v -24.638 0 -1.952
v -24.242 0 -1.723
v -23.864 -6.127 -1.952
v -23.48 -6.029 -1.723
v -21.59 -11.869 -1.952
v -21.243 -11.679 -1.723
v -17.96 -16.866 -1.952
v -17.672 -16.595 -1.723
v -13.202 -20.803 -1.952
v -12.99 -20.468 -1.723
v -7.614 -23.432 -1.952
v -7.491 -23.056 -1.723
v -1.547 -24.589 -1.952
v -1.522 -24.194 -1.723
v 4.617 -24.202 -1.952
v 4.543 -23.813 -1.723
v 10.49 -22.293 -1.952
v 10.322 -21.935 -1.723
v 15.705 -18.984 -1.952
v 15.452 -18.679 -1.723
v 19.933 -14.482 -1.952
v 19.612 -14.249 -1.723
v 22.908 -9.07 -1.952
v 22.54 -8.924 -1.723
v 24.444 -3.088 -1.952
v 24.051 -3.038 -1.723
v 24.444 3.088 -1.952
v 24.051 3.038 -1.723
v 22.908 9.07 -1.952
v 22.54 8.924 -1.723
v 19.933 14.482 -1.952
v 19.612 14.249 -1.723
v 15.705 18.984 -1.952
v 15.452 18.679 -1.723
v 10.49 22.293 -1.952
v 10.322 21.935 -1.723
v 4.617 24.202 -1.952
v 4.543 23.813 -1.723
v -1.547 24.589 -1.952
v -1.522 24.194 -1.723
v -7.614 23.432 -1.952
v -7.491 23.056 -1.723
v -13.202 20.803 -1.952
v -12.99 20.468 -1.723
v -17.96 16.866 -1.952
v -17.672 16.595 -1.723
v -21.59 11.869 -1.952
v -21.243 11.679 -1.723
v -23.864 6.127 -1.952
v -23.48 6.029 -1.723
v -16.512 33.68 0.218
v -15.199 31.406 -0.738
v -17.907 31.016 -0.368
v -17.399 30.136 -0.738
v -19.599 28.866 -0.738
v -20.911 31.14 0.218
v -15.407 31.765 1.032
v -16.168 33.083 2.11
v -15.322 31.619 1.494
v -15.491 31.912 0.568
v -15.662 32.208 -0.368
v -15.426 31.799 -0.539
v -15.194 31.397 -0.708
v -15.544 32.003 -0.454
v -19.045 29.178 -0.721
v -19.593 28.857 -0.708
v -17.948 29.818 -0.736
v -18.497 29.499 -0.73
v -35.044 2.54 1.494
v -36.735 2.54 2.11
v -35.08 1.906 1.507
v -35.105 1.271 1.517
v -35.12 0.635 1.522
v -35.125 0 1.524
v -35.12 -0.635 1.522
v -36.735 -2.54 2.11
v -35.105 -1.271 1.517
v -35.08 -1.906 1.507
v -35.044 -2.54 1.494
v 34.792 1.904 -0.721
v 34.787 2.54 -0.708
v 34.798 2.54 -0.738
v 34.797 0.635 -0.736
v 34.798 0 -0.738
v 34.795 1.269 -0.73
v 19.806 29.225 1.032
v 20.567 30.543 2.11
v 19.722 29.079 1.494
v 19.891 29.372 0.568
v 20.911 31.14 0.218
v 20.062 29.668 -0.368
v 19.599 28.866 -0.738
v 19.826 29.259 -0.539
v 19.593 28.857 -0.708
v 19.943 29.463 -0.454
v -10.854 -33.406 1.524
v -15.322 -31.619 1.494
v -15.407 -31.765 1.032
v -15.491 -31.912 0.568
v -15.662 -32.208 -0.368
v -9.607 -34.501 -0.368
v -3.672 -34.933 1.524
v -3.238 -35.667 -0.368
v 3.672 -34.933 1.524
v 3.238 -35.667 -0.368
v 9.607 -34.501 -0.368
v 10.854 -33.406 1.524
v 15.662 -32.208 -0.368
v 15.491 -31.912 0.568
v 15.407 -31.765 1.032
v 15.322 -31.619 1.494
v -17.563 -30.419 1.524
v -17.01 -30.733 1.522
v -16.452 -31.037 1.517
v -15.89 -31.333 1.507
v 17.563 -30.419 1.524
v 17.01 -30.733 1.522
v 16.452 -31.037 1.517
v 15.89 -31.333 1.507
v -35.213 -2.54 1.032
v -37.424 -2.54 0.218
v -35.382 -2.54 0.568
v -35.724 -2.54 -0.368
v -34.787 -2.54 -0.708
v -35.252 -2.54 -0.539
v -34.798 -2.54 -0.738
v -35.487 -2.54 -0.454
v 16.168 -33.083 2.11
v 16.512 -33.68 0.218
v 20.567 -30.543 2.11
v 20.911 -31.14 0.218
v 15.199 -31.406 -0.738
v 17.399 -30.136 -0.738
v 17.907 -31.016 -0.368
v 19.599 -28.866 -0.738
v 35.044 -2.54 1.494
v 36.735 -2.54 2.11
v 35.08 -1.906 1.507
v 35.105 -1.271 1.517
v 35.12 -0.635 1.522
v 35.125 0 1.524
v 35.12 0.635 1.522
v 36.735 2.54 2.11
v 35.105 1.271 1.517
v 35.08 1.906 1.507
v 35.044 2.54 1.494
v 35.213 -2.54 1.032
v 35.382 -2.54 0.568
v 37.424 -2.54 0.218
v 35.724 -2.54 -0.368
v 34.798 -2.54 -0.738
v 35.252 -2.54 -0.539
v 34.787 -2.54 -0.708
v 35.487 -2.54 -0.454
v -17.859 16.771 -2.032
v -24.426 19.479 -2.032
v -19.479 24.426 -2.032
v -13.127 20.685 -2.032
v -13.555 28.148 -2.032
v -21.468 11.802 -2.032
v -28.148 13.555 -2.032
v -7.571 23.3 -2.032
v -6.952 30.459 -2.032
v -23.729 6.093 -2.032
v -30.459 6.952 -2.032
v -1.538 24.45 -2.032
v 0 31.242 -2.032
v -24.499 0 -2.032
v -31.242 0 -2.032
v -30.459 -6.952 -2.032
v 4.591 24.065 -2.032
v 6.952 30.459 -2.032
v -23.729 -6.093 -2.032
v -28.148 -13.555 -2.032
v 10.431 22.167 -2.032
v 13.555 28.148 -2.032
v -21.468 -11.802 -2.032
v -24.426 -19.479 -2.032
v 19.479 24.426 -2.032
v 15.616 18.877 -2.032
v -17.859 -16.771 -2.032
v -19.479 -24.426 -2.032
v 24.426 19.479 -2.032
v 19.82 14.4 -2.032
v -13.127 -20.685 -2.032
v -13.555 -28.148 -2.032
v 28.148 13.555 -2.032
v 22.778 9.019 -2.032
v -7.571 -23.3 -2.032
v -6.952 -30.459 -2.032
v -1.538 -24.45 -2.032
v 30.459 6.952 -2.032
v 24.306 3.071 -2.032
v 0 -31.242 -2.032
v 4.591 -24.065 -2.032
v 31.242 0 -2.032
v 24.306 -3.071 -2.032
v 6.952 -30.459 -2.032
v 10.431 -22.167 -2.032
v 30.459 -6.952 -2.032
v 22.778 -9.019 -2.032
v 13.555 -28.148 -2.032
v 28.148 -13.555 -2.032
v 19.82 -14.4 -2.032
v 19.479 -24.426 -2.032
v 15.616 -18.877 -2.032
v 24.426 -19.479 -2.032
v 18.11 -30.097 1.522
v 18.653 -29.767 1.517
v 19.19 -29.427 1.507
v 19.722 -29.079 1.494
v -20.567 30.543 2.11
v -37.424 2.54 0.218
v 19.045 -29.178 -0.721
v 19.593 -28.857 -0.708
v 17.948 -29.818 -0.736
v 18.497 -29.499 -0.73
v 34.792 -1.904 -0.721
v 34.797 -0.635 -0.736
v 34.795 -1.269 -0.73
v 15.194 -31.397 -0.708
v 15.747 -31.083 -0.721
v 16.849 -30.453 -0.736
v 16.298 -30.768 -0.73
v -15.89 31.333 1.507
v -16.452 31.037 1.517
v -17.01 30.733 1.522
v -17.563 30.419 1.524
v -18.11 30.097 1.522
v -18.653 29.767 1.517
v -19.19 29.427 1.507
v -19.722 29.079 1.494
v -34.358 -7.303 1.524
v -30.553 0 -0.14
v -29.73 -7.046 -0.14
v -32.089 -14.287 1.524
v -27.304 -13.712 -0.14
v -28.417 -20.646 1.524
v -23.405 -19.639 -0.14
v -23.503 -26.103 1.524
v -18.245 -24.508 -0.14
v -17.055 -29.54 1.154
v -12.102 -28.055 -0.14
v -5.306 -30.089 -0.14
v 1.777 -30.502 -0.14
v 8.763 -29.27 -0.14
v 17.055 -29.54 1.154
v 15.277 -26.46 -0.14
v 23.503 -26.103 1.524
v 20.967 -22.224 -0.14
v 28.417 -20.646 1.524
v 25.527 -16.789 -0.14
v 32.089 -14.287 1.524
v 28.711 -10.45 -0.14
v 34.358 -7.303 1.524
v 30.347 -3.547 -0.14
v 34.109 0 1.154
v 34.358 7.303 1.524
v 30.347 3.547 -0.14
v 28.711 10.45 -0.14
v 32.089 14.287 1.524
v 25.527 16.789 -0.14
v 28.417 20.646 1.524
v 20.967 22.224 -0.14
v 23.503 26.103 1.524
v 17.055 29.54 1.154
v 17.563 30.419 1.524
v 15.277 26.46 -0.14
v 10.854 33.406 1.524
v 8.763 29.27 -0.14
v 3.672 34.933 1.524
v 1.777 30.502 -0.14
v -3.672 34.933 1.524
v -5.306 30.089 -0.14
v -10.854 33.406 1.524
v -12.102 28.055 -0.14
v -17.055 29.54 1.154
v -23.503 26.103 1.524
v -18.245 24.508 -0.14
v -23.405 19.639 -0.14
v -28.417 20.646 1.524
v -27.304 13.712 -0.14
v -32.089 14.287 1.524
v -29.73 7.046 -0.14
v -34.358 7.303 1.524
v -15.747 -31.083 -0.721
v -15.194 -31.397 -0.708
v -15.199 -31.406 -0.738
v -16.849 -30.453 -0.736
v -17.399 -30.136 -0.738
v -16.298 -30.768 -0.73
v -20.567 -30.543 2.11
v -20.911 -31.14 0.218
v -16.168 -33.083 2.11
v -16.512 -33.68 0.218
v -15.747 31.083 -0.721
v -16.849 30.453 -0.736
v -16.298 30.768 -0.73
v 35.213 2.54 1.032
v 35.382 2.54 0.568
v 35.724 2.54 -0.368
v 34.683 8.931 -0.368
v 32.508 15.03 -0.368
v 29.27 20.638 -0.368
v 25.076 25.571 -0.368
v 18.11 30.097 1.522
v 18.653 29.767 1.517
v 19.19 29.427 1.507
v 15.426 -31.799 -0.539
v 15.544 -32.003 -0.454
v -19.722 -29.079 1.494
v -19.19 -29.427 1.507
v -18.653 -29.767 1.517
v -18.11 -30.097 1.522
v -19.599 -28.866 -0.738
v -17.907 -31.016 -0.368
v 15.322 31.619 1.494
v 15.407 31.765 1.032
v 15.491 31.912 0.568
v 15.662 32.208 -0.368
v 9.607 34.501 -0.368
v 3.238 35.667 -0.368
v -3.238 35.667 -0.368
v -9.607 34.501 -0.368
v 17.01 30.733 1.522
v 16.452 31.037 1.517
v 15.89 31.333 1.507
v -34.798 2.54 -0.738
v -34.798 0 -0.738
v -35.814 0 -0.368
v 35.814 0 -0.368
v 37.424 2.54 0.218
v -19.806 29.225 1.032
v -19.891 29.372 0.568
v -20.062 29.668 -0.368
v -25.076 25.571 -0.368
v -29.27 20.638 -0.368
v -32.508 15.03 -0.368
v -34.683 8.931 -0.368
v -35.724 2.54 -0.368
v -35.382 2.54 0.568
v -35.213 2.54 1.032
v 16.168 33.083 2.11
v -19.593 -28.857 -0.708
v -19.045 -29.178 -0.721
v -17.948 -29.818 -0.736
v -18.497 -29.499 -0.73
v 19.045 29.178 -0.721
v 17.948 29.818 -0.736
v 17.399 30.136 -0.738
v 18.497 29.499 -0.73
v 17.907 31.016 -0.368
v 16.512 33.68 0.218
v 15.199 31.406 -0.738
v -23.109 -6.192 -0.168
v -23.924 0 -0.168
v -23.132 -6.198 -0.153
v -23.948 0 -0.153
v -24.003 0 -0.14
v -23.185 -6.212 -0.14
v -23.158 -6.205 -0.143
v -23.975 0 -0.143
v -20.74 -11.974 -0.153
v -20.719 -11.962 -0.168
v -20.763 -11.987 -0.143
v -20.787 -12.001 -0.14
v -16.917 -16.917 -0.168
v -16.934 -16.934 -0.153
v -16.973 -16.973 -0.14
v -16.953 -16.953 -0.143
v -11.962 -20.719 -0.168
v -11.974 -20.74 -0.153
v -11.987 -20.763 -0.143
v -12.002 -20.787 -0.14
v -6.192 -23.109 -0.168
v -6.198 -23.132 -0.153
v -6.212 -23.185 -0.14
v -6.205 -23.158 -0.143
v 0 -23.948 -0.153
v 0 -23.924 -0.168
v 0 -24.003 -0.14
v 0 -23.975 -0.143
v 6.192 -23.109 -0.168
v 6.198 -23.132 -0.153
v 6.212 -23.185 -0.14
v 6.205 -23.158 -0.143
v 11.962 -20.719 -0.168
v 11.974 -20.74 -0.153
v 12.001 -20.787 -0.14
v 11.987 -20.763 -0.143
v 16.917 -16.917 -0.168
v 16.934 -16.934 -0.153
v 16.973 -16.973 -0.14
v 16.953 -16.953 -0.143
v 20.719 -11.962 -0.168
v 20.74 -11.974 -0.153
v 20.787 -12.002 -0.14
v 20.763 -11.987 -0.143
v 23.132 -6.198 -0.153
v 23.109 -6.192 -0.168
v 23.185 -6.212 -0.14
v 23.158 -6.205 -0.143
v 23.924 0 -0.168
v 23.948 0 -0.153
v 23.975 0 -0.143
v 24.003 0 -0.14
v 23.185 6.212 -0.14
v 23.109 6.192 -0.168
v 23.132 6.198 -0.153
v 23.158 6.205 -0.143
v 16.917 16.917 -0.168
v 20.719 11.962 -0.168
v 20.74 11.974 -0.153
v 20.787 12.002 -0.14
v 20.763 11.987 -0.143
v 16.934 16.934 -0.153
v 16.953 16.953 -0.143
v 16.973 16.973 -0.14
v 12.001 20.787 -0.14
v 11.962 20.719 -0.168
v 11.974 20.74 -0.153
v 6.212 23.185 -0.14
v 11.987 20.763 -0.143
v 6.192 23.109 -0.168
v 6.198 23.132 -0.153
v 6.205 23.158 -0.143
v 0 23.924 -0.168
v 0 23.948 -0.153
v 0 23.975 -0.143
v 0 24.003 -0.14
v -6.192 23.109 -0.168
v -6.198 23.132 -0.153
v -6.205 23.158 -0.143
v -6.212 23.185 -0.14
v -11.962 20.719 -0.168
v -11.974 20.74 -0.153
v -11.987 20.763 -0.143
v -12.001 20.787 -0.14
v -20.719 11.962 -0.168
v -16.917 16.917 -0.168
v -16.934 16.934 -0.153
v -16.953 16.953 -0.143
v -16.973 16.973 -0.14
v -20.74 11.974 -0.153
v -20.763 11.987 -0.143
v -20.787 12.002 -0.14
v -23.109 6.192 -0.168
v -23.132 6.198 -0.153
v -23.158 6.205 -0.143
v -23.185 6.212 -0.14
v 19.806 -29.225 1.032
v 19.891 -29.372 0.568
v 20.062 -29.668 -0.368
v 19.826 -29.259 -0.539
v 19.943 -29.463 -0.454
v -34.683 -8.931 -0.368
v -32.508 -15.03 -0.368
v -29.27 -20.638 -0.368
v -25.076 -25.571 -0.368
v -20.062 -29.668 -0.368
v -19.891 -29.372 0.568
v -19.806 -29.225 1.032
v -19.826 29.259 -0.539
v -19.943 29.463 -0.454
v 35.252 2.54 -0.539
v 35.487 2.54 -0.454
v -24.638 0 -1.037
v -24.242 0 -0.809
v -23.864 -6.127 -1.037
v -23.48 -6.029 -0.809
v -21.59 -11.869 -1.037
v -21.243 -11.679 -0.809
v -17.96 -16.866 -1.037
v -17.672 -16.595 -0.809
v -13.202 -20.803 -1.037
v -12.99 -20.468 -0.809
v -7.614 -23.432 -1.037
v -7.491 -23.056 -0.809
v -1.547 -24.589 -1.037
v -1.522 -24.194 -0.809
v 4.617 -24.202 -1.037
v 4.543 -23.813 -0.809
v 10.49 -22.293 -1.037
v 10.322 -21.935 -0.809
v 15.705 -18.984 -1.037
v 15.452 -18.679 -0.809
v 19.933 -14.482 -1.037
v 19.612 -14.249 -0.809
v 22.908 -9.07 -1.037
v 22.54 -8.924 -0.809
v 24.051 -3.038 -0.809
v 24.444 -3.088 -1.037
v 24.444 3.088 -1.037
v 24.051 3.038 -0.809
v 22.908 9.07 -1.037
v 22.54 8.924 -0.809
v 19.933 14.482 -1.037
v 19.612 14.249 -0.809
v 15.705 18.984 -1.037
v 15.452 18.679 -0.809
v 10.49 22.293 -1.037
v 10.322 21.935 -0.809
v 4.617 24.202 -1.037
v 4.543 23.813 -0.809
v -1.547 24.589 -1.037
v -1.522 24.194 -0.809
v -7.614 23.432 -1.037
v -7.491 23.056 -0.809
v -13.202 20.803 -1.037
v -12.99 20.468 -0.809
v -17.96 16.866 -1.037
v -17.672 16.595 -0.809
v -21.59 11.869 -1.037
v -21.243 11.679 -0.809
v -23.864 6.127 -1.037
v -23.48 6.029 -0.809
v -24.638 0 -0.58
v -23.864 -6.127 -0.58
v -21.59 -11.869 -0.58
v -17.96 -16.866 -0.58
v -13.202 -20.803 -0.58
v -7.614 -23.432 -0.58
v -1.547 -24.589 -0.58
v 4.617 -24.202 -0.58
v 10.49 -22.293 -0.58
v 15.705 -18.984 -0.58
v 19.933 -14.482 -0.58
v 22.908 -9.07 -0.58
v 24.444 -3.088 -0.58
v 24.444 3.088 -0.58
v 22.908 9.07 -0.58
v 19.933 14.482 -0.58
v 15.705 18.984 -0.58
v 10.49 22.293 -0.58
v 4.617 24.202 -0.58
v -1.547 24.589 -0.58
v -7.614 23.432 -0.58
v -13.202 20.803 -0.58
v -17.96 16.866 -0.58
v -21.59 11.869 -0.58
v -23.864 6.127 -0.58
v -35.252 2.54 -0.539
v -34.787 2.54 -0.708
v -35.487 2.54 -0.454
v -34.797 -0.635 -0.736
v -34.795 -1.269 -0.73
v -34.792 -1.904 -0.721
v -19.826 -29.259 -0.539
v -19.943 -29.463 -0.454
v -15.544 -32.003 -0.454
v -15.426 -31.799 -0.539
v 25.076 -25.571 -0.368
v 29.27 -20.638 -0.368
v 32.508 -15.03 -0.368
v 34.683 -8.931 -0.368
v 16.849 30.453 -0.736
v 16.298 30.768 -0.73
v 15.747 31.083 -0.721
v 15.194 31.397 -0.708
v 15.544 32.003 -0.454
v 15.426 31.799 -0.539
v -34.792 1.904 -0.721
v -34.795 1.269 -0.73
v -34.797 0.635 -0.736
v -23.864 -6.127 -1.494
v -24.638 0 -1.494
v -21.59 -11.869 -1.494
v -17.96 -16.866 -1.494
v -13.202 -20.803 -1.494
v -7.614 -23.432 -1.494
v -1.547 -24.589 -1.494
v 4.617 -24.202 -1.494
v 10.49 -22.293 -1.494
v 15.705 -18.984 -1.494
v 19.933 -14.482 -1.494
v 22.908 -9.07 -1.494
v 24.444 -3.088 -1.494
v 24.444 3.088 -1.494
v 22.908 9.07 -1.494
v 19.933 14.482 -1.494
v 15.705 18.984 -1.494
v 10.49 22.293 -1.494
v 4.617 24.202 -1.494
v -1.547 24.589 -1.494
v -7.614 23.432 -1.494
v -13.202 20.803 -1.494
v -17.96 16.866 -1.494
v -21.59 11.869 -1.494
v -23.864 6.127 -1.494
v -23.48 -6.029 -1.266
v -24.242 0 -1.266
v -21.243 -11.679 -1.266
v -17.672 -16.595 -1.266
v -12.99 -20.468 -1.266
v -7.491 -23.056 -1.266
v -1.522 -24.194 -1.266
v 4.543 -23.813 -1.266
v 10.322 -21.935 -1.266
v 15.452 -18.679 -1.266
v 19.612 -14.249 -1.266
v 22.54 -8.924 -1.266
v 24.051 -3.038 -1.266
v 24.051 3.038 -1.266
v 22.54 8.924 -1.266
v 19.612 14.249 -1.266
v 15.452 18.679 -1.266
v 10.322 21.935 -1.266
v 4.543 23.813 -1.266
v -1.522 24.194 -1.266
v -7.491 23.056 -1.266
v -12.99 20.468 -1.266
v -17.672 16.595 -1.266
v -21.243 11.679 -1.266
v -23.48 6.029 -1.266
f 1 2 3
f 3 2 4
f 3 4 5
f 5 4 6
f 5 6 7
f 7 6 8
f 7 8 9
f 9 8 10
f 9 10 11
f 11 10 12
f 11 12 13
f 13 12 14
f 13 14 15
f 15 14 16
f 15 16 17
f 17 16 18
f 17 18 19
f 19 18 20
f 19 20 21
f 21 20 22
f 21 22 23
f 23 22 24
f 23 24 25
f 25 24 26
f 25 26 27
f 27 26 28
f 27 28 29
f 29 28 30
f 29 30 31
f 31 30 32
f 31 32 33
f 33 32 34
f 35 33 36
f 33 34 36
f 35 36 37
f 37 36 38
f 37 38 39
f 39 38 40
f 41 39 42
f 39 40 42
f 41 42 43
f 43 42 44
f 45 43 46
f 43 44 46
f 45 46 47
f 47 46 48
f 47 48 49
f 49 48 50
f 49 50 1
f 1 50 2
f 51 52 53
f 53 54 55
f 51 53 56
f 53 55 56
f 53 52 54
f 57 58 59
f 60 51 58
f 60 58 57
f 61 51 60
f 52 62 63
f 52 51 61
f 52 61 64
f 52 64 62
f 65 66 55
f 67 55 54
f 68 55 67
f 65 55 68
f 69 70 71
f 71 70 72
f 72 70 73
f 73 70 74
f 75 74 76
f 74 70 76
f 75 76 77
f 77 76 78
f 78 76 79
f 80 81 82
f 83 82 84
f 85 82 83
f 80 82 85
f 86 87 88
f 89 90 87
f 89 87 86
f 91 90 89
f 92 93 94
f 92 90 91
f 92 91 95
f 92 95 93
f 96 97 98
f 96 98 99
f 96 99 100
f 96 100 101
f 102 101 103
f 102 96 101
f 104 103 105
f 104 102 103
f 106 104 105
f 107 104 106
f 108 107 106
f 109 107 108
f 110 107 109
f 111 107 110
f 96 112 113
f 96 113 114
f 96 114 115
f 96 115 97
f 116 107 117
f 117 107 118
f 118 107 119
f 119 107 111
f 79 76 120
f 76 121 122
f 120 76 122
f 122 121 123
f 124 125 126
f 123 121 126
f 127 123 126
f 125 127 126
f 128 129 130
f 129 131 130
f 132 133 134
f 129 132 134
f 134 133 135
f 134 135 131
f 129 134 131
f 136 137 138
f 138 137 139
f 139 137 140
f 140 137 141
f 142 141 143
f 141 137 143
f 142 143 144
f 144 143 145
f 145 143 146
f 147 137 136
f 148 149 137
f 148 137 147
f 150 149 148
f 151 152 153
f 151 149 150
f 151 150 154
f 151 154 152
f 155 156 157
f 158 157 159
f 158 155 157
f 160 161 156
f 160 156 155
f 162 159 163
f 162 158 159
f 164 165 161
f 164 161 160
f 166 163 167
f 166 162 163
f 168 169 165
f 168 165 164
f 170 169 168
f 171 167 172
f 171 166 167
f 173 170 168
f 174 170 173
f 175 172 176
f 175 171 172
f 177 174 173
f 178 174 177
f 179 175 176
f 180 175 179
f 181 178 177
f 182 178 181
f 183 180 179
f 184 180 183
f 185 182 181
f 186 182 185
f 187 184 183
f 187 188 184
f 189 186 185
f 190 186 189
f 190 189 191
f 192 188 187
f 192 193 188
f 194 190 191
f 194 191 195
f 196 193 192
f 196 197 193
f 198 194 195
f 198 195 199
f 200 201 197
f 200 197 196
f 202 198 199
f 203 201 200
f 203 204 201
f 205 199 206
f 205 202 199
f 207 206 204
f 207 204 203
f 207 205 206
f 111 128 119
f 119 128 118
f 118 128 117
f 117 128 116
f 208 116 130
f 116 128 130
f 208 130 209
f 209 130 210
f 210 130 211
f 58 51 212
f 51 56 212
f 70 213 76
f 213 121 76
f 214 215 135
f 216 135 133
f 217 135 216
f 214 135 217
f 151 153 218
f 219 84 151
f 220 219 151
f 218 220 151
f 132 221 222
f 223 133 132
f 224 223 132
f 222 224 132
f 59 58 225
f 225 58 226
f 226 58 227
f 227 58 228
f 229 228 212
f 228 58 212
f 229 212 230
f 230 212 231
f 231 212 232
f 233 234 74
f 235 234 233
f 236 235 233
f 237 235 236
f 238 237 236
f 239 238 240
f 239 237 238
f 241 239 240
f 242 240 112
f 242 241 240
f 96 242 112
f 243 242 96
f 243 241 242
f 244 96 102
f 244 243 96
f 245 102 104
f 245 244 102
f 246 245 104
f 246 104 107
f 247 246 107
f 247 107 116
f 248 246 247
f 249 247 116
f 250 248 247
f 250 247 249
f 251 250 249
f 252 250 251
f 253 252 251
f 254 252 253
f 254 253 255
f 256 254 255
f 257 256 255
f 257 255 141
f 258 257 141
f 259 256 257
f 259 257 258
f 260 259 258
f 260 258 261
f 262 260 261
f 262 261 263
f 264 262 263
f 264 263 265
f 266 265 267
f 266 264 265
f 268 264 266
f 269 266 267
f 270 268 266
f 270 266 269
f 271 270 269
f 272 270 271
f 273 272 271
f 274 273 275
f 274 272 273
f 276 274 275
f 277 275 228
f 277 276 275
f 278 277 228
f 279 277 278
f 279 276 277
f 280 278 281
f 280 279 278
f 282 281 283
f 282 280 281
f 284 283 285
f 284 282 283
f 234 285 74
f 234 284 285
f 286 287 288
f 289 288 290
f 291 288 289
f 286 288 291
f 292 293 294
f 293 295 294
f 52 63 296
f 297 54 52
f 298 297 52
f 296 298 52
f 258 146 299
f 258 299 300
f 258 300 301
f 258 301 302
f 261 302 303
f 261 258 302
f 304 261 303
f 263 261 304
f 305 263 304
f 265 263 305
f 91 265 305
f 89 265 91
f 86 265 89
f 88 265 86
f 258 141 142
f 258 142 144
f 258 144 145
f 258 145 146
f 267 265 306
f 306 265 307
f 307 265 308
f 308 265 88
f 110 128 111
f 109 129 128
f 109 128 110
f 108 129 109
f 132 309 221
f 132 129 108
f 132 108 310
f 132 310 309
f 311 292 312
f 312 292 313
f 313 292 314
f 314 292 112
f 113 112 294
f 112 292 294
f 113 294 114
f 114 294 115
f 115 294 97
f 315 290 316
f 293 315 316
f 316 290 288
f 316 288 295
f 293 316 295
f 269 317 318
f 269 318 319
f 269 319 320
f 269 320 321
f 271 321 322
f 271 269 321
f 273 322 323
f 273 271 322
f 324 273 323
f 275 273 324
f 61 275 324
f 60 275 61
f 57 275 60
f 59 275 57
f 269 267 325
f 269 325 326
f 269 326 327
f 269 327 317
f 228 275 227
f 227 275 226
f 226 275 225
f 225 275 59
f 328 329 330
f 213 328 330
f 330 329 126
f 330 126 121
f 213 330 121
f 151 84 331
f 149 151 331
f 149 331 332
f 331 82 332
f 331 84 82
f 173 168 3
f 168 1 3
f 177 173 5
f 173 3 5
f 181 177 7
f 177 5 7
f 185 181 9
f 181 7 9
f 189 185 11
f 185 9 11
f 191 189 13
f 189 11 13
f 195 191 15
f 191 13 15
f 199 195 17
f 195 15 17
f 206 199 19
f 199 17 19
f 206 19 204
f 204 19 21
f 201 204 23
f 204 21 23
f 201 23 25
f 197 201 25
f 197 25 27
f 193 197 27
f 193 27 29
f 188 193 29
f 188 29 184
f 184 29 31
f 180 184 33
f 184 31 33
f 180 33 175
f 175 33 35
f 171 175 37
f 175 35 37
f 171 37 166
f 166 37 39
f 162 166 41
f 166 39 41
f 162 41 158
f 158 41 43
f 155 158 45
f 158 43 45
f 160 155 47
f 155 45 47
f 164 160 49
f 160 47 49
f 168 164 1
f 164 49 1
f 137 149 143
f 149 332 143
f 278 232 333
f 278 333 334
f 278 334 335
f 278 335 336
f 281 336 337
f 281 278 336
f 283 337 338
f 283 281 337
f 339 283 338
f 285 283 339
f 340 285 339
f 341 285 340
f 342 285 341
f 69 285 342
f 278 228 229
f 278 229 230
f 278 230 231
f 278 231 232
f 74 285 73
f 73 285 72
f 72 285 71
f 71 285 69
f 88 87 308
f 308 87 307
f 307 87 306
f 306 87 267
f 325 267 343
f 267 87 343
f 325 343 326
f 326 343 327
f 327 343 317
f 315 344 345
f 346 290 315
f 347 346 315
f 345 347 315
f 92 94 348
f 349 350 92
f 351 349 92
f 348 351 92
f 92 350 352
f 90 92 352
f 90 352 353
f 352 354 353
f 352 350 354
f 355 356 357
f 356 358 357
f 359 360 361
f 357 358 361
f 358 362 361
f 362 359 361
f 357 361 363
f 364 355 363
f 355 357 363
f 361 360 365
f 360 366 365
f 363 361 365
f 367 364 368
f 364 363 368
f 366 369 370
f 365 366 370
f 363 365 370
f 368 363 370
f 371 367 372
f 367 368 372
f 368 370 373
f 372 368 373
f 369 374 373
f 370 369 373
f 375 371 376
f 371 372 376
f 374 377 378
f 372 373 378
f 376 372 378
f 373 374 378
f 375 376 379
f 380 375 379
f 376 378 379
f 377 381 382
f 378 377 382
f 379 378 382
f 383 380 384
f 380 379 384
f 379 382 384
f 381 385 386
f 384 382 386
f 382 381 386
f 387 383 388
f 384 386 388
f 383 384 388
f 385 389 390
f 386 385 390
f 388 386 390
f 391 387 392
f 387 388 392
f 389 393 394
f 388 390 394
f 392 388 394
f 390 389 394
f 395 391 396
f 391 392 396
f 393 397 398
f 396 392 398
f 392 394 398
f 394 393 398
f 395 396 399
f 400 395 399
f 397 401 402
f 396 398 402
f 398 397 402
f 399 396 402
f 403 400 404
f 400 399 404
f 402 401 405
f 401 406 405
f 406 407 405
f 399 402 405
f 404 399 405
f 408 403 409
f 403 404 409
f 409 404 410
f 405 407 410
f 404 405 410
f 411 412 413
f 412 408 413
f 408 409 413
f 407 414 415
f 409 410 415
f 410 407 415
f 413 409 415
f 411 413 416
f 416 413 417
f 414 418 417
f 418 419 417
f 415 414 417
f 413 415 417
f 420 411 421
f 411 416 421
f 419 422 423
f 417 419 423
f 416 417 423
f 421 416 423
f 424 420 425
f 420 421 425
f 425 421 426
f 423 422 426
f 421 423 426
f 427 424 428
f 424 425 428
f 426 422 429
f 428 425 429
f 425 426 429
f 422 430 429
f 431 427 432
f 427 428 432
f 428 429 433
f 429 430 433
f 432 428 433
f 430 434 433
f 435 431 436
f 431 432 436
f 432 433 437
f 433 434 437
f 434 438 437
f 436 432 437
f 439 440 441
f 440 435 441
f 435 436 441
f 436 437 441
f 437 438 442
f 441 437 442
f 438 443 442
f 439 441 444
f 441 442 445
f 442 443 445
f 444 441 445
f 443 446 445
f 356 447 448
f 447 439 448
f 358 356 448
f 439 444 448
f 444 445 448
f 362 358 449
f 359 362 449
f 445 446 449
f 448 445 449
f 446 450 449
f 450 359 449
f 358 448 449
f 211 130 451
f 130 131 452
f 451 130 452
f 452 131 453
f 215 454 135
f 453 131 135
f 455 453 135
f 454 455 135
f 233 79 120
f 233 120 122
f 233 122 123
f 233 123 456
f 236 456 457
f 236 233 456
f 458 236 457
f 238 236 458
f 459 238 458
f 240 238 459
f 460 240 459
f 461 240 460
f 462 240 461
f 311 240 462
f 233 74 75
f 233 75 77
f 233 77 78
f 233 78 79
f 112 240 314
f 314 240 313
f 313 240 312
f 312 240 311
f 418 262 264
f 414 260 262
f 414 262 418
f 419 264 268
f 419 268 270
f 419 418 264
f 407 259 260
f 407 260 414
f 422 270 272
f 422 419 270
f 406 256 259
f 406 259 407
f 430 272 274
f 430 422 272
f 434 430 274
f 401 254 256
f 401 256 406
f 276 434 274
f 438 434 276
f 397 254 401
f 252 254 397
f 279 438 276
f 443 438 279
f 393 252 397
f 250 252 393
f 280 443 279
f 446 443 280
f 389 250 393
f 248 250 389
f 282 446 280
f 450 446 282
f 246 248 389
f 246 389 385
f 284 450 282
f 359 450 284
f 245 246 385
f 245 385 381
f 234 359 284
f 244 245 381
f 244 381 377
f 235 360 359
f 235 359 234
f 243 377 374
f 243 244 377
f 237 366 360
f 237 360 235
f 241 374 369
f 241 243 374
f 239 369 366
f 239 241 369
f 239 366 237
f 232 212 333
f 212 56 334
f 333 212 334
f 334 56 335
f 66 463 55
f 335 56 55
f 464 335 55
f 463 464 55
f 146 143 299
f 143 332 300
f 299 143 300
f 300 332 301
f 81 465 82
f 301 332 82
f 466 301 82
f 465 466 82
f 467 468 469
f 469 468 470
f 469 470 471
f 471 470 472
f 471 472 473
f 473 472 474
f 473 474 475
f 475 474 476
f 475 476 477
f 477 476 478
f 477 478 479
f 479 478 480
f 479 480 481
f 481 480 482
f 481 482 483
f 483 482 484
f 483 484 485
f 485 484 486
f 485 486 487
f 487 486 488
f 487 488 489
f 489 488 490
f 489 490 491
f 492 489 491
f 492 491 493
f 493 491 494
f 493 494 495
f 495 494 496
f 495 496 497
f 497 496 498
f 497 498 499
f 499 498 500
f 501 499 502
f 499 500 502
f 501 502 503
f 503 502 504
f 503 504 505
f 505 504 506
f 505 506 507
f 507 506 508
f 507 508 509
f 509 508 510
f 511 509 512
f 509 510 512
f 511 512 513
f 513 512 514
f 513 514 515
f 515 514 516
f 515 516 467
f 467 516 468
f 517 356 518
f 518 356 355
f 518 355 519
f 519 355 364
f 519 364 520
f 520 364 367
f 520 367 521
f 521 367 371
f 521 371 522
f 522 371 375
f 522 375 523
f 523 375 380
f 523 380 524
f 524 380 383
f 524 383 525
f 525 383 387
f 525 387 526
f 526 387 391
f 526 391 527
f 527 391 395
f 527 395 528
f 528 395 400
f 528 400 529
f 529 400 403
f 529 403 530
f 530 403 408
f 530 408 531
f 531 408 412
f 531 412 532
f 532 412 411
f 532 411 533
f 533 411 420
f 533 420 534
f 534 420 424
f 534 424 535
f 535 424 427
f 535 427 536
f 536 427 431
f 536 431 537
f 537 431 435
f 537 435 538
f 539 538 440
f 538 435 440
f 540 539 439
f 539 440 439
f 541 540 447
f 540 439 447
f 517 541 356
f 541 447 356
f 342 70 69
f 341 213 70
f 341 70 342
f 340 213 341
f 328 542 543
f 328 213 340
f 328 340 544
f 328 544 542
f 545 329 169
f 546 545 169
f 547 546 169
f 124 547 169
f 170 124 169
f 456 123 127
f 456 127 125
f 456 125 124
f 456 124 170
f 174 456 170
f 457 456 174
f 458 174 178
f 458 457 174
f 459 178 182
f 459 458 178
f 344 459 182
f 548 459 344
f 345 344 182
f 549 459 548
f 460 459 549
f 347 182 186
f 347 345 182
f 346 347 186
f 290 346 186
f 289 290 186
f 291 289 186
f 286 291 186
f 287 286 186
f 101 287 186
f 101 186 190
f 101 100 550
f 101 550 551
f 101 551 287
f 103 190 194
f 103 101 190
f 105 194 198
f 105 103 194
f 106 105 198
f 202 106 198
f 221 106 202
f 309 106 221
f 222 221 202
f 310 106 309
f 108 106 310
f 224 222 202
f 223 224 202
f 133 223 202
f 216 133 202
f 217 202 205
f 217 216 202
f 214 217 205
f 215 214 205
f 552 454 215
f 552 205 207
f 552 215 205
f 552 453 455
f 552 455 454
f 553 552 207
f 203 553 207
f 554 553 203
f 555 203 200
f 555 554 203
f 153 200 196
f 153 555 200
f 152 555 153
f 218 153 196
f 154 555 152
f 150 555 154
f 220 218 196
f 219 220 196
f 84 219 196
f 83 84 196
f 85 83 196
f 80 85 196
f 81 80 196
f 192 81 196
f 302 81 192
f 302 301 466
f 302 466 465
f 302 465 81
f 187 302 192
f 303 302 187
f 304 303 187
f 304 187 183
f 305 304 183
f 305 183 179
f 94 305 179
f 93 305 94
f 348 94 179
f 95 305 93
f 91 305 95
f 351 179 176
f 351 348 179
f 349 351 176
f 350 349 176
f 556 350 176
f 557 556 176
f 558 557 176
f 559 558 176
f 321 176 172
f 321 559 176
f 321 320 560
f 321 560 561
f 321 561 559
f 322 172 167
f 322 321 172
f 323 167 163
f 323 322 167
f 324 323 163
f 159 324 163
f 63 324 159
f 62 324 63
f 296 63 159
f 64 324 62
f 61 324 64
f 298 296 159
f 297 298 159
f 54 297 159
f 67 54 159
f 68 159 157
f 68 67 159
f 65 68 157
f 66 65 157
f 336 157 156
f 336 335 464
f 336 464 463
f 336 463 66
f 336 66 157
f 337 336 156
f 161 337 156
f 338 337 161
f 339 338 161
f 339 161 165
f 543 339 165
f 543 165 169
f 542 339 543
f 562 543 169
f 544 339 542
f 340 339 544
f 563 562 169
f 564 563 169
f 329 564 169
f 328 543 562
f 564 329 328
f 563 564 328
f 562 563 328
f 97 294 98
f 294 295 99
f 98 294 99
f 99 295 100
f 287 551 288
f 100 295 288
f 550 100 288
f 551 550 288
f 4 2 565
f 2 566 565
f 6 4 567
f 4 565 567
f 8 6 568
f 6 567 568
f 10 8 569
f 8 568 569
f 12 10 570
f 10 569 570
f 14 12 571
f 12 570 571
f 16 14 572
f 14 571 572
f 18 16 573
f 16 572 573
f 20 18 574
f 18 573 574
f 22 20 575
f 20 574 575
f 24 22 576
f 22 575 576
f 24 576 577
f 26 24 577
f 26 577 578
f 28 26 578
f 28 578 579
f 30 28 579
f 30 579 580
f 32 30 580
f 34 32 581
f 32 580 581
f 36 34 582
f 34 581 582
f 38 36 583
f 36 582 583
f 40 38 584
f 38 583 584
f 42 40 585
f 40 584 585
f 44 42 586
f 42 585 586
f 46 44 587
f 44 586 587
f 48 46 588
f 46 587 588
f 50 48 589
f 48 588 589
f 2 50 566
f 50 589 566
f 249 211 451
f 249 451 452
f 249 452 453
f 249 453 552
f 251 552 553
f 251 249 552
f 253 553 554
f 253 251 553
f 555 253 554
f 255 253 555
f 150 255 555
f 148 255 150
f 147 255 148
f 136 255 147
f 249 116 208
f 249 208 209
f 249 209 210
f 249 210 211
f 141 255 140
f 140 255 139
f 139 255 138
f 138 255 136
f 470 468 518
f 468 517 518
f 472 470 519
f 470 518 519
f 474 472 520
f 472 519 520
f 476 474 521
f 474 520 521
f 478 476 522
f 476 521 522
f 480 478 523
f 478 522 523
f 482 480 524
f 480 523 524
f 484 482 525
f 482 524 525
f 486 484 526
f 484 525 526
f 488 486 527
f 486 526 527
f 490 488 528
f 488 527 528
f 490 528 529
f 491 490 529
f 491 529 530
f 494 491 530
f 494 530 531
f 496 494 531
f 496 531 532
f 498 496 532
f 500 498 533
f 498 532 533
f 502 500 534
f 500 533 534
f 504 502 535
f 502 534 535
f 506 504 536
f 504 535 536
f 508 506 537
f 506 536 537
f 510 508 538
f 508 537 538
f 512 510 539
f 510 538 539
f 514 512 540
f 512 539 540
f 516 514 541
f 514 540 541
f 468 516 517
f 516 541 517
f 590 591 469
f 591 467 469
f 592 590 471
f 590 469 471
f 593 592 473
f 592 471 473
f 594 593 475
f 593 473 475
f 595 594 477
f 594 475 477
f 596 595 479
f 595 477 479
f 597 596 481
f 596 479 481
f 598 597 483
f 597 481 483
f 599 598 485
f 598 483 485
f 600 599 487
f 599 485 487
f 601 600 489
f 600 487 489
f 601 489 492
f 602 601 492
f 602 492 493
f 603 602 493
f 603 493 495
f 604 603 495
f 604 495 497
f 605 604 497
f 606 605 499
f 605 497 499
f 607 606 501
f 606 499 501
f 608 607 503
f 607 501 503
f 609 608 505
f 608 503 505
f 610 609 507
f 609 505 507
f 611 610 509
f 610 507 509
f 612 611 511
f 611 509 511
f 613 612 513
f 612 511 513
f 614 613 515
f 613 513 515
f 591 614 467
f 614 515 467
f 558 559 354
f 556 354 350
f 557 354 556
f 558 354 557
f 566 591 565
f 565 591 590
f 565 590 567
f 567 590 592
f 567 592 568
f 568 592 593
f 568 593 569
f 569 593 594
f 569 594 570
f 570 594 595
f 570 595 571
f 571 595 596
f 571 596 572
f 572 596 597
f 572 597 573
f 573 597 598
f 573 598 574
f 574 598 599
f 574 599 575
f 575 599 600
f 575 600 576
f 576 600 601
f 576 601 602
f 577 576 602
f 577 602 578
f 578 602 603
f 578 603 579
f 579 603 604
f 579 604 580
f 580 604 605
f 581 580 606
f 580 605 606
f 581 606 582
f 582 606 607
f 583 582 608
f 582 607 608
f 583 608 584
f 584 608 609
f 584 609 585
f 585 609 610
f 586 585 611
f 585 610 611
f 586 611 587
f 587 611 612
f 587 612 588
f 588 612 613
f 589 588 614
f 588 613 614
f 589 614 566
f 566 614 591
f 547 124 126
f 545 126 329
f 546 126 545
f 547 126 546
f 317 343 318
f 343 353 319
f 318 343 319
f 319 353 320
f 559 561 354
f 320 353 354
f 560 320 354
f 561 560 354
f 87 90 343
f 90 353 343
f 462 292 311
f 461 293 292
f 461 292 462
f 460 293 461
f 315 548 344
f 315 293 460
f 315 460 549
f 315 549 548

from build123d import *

# Parameters (mm, degrees)
EXTRUDE3_DEPTH    = 2.54
CIRPATTERN1_COUNT = 6
FILLET4_R         = 0.127
LPATTERN1_COUNT   = 5
LPATTERN1_PITCH   = 0.4572


with BuildPart() as part:
    # Sketch1 → Revolve1 (revolve)
    with BuildSketch(Plane(origin=(0, 0, 0), x_dir=(1, 0, 0), z_dir=(0, 1, 0)), mode=Mode.PRIVATE) as revolve1_sk:
        Polygon((23.876, 2.032), (31.242, 2.032), (35.814, 0.367928089), (35.12539449, -1.524), (30.55339449, 0.140071911), (23.876, 0.140071911), align=None)
    revolve(revolve1_sk.sketch.rotate(Axis((0, 0, -37.83814433), (0, 0, 1)), 180), axis=Axis((0, 0, -37.83814433), (0, 0, 1)))  # turned: the seam where the file's is

    # Sketch3 → Extrude3 (add, symmetric)
    with BuildSketch(Plane(origin=(0, 0, 0), x_dir=(1, 0, 0), z_dir=(0, 1, 0))):
        Polygon((34.798, 0.737721847), (37.423501182, -0.217882434), (36.734895673, -2.109810522), (34.10939449, -1.154206242), align=None)
    extrude3 = extrude(amount=EXTRUDE3_DEPTH, both=True)

    # CirPattern1: Extrude3 ×6 about axis
    cirpattern1_axis = Axis((0, 0, 0), (0, 0, 1))
    for i in range(1, CIRPATTERN1_COUNT):
        add(extrude3.rotate(cirpattern1_axis, i * 360 / CIRPATTERN1_COUNT))

    # Fillet4
    fillet4_edges = [part.edges().sort_by_distance(p)[0] for p in [
        (23.876, 0, -0.140071911),
        (23.876, 0, -2.032),
    ]]
    fillet(fillet4_edges, radius=FILLET4_R)

    # Sketch4 → Cut-Revolve1 (revolve, cut)
    with BuildSketch(Plane(origin=(0, 0, 0), x_dir=(1, 0, 0), z_dir=(0, 1, 0))):
        Polygon((-23.876, 0.140071911), (-23.876, 1.019953721), (-24.638, 0.580012816), align=None)
    cut_revolve1 = revolve(axis=Axis((0, 0, -37.83814433), (0, 0, 1)), mode=Mode.SUBTRACT)

    # LPattern1: Cut-Revolve1 ×5
    with Locations(*[(0, 0, -i * LPATTERN1_PITCH) for i in range(1, LPATTERN1_COUNT)]):
        add(cut_revolve1, mode=Mode.SUBTRACT)


solid = part.part
